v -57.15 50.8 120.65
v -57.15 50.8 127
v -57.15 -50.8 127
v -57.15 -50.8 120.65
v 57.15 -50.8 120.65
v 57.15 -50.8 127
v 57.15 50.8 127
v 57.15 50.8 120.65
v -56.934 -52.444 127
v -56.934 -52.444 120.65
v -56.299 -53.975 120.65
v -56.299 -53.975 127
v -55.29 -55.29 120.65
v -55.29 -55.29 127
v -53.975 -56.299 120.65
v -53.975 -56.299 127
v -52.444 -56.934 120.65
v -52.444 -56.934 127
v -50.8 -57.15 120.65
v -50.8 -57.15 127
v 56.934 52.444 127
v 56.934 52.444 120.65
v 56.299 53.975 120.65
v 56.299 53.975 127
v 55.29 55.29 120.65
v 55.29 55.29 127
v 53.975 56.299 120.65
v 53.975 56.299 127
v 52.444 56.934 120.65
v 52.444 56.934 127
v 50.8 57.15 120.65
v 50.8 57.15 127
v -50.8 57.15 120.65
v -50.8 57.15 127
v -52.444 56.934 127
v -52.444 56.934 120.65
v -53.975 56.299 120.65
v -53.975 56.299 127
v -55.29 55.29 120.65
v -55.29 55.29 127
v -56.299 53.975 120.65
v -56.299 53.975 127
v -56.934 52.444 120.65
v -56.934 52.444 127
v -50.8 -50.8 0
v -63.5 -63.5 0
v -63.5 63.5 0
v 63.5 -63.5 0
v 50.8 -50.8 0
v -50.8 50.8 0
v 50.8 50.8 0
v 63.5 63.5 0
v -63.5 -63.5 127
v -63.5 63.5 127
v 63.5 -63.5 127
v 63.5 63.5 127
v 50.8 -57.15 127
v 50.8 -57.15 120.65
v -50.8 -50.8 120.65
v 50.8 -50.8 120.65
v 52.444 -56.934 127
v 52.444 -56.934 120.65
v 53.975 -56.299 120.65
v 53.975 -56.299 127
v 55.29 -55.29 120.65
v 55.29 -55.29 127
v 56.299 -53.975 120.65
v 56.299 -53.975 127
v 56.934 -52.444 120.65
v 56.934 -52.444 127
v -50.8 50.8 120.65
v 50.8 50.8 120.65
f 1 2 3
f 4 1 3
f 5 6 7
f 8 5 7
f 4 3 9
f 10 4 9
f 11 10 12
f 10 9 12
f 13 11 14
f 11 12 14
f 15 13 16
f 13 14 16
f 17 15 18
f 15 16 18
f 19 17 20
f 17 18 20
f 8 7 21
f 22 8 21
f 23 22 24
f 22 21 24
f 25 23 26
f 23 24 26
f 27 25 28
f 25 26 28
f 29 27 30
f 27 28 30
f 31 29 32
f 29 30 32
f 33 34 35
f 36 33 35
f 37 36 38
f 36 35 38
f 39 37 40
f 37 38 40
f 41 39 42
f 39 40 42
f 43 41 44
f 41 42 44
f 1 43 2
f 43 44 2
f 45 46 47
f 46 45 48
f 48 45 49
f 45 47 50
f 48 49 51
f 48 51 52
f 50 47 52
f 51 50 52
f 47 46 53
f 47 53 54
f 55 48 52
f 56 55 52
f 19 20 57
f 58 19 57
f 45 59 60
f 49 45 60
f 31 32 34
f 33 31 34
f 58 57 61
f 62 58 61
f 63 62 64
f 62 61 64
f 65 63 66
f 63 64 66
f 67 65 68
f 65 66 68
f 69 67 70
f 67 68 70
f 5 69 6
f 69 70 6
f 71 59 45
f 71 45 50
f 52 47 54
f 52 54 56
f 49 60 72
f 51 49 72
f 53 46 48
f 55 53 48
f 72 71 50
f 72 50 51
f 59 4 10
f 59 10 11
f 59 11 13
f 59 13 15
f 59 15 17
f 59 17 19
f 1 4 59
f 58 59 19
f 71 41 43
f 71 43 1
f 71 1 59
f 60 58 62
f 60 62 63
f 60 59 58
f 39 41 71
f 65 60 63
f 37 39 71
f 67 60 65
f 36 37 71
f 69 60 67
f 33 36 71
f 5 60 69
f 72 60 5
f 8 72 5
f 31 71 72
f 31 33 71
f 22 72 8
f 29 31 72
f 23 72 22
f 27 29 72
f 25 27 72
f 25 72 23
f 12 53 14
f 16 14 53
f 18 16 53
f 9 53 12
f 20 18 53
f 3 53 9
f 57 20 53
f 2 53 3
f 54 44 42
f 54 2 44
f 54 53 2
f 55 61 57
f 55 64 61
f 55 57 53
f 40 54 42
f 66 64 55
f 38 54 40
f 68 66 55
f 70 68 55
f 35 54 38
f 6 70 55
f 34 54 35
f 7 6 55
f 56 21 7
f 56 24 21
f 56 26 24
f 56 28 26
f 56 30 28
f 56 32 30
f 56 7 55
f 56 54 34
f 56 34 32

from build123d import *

# Parameters (mm, degrees)
F0_W     = 127
F0_H     = 127
F1_DEPTH = 127
F3_DEPTH = 6.35
F4_W     = 101.6
F4_H     = 101.6
F5_DEPTH = 127


with BuildPart() as f1:
    # F0 (on Top) → F1 (new body)
    with BuildSketch(Plane.XY):
        Rectangle(F0_W, F0_H)
    extrude(amount=F1_DEPTH)

    # F2 (on face) → F3 (cut)
    with BuildSketch(Plane.XY.offset(127)):
        with BuildLine():
            Line((-50.8, -57.15), (50.8, -57.15))
            ThreePointArc((50.8, -57.15), (55.290128, -55.290128), (57.15, -50.8))
            Line((57.15, -50.8), (57.15, 50.8))
            ThreePointArc((57.15, 50.8), (55.290128, 55.290128), (50.8, 57.15))
            Line((50.8, 57.15), (-50.8, 57.15))
            ThreePointArc((-50.8, 57.15), (-55.290128, 55.290128), (-57.15, 50.8))
            Line((-57.15, 50.8), (-57.15, -50.8))
            ThreePointArc((-57.15, -50.8), (-55.290128, -55.290128), (-50.8, -57.15))
        make_face()
    extrude(amount=-F3_DEPTH, mode=Mode.SUBTRACT)

    # F4 (on face) → F5 (cut)
    with BuildSketch(Plane.XY.offset(120.65)):
        Rectangle(F4_W, F4_H)
    extrude(amount=-F5_DEPTH, mode=Mode.SUBTRACT)


solid = f1.part
